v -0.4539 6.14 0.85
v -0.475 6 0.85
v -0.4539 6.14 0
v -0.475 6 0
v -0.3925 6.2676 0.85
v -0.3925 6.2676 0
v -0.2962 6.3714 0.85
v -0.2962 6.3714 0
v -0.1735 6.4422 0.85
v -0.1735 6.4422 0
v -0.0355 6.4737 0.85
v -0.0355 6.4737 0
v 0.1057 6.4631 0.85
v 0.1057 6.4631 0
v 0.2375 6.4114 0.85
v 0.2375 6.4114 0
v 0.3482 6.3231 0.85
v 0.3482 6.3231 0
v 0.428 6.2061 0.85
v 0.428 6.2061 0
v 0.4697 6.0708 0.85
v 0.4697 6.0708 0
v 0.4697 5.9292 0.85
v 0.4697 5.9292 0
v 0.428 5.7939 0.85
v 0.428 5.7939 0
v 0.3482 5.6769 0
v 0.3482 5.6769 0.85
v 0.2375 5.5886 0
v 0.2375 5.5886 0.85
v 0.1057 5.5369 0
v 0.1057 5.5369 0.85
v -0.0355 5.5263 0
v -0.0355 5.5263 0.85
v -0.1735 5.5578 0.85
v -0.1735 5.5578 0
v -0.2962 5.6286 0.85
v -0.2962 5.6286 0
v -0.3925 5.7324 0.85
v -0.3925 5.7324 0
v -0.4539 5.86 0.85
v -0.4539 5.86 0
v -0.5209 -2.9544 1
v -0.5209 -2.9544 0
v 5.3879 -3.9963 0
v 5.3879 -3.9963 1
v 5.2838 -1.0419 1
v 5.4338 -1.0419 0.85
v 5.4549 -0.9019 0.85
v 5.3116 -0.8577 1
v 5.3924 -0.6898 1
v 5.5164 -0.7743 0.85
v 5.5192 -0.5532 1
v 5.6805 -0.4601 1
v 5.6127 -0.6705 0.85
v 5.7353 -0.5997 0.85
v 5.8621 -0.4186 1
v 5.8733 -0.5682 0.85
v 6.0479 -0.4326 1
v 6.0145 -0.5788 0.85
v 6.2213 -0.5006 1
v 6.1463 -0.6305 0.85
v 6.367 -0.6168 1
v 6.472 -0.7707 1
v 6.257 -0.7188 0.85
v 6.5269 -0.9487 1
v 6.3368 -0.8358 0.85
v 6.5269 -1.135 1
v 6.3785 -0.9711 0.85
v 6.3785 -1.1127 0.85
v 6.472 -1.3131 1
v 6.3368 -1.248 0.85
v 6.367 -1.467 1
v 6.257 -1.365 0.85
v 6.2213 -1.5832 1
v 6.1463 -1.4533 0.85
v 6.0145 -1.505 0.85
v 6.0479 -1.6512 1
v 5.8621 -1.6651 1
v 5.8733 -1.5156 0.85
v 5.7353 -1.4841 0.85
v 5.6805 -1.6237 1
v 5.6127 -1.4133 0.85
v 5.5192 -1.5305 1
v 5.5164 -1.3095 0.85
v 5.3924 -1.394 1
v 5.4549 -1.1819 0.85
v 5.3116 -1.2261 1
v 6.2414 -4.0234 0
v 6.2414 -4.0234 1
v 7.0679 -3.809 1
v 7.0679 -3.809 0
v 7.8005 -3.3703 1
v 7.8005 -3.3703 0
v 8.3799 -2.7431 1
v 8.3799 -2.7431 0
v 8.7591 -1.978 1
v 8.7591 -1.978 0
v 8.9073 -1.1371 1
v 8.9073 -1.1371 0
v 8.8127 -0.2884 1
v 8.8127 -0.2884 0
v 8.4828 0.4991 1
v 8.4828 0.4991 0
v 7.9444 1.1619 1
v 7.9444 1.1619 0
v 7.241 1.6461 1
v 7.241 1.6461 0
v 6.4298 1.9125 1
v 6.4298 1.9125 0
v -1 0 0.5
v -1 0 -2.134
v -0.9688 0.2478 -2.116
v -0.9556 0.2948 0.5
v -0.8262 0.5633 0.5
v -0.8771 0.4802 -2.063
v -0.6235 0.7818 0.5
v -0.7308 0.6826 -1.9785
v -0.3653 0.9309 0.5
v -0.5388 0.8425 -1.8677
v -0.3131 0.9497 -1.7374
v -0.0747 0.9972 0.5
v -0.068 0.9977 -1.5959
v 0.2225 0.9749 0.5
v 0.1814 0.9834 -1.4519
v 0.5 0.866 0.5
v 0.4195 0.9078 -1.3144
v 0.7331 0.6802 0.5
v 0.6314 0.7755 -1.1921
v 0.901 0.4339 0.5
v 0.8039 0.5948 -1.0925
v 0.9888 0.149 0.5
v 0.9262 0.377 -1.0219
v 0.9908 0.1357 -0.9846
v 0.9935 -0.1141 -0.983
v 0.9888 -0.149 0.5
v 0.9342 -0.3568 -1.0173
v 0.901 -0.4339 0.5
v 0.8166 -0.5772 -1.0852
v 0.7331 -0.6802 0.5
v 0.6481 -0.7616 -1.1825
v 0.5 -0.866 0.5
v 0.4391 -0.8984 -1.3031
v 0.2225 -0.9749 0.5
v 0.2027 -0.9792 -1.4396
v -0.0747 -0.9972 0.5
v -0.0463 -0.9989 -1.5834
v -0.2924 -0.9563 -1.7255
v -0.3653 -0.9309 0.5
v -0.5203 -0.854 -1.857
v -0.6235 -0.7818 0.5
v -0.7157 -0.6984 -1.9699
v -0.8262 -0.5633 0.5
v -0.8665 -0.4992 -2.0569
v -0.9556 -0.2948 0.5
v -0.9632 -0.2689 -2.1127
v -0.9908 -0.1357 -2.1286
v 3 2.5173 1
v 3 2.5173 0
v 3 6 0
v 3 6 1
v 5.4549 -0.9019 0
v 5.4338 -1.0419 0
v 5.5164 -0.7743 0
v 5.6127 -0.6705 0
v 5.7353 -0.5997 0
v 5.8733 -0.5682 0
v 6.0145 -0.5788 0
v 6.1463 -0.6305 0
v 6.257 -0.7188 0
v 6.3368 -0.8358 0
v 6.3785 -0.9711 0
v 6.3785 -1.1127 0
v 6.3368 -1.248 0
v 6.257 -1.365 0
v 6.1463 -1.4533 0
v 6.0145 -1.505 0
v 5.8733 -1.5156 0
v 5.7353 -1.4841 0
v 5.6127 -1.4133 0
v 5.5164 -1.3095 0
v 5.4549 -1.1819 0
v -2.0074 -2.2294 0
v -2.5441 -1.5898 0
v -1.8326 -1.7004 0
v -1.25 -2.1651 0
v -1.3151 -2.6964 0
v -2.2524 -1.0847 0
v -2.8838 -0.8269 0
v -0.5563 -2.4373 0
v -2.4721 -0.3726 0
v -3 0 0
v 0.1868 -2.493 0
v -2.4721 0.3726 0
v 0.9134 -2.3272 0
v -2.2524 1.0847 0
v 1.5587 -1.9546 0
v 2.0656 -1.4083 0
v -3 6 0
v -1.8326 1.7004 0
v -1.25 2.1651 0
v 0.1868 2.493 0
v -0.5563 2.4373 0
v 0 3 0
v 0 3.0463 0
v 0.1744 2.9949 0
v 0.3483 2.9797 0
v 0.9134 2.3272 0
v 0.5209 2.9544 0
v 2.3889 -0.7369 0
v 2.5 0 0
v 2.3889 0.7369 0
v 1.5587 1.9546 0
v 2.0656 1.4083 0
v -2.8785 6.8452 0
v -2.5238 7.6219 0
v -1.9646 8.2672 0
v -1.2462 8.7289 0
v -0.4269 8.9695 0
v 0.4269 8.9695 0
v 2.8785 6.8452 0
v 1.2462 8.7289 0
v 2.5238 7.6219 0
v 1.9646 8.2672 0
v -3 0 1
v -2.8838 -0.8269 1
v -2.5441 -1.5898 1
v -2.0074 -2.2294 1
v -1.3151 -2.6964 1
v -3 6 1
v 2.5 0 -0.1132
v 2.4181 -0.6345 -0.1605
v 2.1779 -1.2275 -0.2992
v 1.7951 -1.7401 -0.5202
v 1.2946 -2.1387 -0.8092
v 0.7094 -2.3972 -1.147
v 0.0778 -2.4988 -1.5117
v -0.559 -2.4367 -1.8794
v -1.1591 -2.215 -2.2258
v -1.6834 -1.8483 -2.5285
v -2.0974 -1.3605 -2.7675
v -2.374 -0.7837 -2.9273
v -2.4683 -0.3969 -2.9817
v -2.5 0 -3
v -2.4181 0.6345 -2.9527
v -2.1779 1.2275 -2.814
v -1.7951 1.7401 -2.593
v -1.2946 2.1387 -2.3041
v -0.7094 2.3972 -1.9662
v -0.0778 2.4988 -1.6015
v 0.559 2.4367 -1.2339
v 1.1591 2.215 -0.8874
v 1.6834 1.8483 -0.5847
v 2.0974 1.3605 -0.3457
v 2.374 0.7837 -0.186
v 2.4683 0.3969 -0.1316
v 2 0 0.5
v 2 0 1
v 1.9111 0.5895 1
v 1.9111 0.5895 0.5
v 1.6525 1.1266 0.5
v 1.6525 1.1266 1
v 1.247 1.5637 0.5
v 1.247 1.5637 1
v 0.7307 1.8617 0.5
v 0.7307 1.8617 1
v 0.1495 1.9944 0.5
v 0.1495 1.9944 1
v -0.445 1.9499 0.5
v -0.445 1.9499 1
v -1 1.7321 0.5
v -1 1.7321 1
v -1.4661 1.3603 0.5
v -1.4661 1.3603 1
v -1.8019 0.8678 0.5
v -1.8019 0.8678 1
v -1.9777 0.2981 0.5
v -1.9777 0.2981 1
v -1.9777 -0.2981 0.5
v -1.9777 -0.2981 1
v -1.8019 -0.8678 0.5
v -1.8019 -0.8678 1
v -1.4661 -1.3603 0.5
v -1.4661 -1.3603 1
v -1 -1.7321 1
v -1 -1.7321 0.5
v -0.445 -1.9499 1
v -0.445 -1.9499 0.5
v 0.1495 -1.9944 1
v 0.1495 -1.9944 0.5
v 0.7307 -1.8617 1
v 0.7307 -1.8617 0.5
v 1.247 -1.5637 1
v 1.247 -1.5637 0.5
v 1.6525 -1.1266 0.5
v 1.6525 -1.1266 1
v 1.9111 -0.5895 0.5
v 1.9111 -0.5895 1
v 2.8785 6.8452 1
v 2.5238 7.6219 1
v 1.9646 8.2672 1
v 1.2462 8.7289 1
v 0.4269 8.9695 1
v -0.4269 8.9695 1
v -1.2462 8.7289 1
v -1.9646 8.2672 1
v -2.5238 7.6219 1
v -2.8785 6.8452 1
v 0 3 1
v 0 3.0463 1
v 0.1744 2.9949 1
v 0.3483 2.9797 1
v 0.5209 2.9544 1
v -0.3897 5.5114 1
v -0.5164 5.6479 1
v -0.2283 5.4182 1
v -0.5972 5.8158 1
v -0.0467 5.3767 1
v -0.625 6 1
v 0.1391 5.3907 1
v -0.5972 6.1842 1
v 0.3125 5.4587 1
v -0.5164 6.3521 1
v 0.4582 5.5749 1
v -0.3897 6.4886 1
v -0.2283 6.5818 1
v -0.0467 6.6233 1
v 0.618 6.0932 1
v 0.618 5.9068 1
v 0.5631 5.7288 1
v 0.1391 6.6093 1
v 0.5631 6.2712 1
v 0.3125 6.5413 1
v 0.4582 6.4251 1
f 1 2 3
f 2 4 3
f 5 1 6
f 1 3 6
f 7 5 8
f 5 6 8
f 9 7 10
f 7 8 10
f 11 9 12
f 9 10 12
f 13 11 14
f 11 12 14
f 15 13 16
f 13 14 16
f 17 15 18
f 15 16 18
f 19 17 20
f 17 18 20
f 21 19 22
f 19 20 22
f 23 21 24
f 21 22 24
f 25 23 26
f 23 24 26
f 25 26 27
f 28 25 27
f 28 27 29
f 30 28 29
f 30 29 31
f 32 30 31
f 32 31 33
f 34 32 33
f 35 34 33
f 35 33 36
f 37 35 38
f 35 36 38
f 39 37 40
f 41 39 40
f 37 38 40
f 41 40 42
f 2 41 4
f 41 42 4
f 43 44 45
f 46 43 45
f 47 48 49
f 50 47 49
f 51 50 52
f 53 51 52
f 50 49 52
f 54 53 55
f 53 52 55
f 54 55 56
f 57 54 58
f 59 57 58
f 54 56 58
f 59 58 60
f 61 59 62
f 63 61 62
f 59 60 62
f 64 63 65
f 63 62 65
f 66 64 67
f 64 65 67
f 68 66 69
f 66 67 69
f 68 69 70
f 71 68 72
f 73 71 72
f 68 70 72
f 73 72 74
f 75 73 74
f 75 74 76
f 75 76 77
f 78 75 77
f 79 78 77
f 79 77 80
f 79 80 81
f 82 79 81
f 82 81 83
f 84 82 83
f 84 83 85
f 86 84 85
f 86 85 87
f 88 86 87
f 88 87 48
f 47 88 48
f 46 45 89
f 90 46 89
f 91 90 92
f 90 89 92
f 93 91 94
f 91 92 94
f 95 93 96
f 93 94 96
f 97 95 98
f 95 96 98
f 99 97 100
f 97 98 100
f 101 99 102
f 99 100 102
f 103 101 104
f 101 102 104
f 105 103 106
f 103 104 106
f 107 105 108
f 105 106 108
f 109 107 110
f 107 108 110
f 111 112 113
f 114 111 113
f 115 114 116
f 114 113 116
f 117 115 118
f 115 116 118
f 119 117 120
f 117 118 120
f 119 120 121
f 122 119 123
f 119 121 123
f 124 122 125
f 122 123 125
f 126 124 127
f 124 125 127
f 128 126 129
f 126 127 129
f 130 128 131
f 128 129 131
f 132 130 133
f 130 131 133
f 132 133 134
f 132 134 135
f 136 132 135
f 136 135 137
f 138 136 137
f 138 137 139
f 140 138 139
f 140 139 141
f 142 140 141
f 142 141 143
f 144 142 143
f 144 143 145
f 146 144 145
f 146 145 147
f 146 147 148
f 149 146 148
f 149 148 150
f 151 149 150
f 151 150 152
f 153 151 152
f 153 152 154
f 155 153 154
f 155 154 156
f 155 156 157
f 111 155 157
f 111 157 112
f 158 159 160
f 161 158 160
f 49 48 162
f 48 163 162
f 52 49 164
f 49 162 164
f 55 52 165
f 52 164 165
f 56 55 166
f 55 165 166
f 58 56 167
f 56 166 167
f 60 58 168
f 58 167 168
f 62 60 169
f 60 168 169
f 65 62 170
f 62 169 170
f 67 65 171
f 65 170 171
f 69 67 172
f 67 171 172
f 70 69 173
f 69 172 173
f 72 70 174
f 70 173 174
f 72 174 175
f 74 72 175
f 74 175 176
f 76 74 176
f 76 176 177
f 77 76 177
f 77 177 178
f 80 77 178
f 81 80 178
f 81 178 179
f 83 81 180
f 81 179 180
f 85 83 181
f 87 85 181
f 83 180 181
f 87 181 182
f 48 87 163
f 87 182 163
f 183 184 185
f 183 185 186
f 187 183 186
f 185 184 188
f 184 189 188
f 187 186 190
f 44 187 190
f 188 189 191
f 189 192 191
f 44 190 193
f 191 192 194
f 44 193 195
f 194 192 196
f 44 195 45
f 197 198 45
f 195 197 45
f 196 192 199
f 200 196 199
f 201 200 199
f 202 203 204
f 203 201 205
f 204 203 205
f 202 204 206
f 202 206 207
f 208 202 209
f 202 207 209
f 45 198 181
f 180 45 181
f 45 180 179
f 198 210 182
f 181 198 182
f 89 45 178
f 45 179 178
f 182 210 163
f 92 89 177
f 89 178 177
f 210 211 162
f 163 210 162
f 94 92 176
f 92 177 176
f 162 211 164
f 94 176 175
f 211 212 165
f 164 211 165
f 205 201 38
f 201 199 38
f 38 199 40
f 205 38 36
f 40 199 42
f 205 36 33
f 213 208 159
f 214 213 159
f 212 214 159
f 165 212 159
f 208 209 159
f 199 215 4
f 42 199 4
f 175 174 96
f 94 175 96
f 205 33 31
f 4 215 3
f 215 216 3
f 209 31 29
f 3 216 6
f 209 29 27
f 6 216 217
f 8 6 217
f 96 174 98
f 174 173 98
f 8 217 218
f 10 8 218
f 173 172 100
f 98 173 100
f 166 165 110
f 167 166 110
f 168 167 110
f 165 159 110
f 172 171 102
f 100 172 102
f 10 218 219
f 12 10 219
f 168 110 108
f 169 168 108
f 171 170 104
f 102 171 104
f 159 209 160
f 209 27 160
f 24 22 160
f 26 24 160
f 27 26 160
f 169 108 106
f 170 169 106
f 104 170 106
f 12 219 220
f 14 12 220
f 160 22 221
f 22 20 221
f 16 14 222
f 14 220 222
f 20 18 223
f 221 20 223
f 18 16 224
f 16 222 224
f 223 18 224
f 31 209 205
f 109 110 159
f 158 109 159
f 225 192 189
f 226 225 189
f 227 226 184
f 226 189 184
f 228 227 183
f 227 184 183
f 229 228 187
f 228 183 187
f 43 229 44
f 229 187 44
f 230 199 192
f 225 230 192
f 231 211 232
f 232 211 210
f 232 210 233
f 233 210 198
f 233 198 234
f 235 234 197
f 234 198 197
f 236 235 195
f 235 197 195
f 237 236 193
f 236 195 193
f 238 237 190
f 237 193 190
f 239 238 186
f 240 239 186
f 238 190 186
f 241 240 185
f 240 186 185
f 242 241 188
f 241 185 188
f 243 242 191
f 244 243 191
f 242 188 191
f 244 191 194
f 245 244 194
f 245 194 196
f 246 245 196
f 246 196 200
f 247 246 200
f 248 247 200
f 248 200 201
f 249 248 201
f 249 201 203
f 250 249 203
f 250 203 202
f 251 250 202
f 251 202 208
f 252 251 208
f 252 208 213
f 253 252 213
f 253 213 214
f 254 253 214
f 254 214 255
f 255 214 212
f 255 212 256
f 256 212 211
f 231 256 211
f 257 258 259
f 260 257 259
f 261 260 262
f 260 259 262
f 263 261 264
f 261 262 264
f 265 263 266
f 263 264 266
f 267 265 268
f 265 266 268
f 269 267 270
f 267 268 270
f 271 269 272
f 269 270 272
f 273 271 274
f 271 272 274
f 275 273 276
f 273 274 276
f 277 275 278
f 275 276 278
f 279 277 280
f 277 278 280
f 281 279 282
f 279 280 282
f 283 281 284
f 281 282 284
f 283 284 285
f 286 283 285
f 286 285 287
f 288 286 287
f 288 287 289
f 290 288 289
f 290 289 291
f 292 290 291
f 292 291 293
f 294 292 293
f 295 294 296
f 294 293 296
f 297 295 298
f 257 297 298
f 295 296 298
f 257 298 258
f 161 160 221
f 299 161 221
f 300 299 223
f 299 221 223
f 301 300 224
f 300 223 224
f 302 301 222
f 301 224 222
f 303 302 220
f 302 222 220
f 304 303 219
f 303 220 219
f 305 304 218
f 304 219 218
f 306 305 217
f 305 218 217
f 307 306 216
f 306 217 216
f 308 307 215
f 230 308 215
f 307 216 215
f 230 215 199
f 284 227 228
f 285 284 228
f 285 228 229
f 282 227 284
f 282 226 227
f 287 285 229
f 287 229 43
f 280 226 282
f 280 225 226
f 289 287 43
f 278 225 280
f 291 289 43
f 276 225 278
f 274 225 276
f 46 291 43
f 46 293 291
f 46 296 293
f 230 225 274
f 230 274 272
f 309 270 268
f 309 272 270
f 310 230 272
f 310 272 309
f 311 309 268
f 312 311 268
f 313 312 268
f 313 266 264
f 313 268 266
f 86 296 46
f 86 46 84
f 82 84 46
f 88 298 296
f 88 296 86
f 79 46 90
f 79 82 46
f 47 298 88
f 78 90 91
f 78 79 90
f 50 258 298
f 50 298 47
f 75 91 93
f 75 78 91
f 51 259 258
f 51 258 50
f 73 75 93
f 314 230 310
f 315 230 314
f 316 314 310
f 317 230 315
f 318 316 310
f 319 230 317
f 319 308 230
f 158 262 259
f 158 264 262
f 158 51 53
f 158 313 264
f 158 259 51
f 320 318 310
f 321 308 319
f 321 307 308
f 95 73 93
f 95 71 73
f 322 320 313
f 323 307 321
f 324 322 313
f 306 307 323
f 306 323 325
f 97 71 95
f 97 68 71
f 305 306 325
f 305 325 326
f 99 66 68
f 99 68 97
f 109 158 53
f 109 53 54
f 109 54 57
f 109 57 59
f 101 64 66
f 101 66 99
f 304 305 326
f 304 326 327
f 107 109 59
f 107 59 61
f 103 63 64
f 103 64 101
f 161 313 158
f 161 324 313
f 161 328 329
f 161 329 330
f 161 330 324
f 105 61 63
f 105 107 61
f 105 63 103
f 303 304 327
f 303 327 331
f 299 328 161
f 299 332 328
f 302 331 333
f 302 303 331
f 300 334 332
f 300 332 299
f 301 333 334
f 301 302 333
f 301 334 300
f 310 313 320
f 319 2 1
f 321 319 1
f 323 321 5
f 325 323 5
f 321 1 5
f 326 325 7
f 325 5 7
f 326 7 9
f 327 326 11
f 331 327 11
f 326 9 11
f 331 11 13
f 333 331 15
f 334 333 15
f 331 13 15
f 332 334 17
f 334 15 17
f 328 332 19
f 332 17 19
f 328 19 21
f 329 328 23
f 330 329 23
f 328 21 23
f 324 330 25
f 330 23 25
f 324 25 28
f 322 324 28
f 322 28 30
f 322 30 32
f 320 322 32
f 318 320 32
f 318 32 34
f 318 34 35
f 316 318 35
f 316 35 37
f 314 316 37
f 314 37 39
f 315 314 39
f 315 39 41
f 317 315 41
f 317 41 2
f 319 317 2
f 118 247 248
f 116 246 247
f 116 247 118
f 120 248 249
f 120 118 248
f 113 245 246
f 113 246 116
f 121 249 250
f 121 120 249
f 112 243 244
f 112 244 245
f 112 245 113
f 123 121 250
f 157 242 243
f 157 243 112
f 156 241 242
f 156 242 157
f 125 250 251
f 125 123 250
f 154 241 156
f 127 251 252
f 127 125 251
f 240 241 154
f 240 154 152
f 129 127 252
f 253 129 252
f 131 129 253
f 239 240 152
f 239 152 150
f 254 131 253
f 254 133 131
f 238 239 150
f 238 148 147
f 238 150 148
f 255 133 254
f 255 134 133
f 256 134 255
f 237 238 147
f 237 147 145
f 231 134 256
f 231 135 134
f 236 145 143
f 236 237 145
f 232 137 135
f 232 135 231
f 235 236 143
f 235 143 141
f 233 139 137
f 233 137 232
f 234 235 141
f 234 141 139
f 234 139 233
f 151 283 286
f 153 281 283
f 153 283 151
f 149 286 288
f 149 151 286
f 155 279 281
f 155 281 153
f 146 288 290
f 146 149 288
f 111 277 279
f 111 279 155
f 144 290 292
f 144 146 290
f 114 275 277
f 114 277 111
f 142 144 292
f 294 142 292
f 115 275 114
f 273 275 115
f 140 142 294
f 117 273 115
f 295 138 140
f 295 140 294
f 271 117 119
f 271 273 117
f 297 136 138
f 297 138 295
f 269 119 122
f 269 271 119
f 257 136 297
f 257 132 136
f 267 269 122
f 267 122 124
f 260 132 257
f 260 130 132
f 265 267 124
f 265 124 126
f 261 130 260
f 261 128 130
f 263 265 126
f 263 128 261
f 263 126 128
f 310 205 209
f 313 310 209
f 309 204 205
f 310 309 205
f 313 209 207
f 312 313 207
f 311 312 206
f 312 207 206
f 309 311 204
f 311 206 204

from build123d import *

# Parameters (mm, degrees)
EXTRUDE_1_DEPTH          = 1
SKETCH_2_R               = 2.5
EXTRUDE_2_DEPTH          = 3
SKETCH_3_R               = 1
CUT_EXTRUDE_1_DEPTH      = 14.280344359
SKETCH_4_R               = 2
CUT_EXTRUDE_2_DEPTH      = 0.5
CUT_EXTRUDE_3_DEPTH      = 14.014128718
CUT_EXTRUDE_3_DEPTH_BACK = 14.014128718
M1_2X0_25_1_D            = 0.95
M1_2X0_25_1_CSINK_D      = 1.25
M1_2X0_25_1_CSINK_ANGLE  = 90


with BuildPart() as part:
    # 草图1 → 凸台-拉伸1 (new body)
    with BuildSketch(Plane.XY):
        with BuildLine():
            ThreePointArc((5.387901985, -3.996312325), (8.863269777, -1.562833599), (6.429791051, 1.912534193))
            Line((6.429791051, 1.912534193), (3, 2.517298894))
            Line((3, 2.517298894), (3, 6))
            ThreePointArc((3, 6), (0, 9), (-3, 6))
            Line((-3, 6), (-3, 0))
            ThreePointArc((-3, 0), (-2.298133329, -1.928362829), (-0.520944533, -2.954423259))
            Line((-0.520944533, -2.954423259), (5.387901985, -3.996312325))
        make_face()
        with BuildLine():
            ThreePointArc((0.520944516, 2.954423262), (0.26146722, 2.988584095), (1e-09, 3))
            Line((0, 3), (0, 3.046279836))
            Line((0, 3.046279836), (0.520944516, 2.954423262))
        make_face(mode=Mode.SUBTRACT)
    extrude(amount=EXTRUDE_1_DEPTH)

    # 草图2 → 凸台-拉伸2 (add)
    with BuildSketch(Plane(origin=(0, 0, 0), x_dir=(-1, 0, 0), z_dir=(0, 0, -1))):
        with Locations(Location((0, 0, 0), (0, 0, 180))):
            Circle(SKETCH_2_R)
    extrude(amount=EXTRUDE_2_DEPTH)

    # 草图3 → 切除-拉伸1 (cut, through all)
    with BuildSketch(Plane(origin=(0, 0, -3), x_dir=(-1, 0, 0), z_dir=(0, 0, -1))):
        Circle(SKETCH_3_R)
    extrude(amount=-CUT_EXTRUDE_1_DEPTH, mode=Mode.SUBTRACT)

    # 草图4 → 切除-拉伸2 (cut)
    with BuildSketch(Plane.XY.offset(1)):
        Circle(SKETCH_4_R)
    extrude(amount=-CUT_EXTRUDE_2_DEPTH, mode=Mode.SUBTRACT)

    # 草图5 → 切除-拉伸3 (cut, two sides: drawn at the far end of the back side and taken through both)
    with BuildSketch(Plane(origin=(0, 0, 0), x_dir=(1, 0, 0), z_dir=(0, 1, 0)).offset(-CUT_EXTRUDE_3_DEPTH_BACK)):
        Polygon((-2.5, 3), (2.5, 0.113248654), (2.5, 3), align=None)
    extrude(amount=CUT_EXTRUDE_3_DEPTH + CUT_EXTRUDE_3_DEPTH_BACK, mode=Mode.SUBTRACT)

    # M1.2x0.25 螺纹孔1 (through all)
    with Locations(Plane.XY.offset(1)):
        with Locations((0, 6), (5.908846518, -1.041889066)):
            CounterSinkHole(M1_2X0_25_1_D / 2, M1_2X0_25_1_CSINK_D / 2, counter_sink_angle=M1_2X0_25_1_CSINK_ANGLE)


solid = part.part
